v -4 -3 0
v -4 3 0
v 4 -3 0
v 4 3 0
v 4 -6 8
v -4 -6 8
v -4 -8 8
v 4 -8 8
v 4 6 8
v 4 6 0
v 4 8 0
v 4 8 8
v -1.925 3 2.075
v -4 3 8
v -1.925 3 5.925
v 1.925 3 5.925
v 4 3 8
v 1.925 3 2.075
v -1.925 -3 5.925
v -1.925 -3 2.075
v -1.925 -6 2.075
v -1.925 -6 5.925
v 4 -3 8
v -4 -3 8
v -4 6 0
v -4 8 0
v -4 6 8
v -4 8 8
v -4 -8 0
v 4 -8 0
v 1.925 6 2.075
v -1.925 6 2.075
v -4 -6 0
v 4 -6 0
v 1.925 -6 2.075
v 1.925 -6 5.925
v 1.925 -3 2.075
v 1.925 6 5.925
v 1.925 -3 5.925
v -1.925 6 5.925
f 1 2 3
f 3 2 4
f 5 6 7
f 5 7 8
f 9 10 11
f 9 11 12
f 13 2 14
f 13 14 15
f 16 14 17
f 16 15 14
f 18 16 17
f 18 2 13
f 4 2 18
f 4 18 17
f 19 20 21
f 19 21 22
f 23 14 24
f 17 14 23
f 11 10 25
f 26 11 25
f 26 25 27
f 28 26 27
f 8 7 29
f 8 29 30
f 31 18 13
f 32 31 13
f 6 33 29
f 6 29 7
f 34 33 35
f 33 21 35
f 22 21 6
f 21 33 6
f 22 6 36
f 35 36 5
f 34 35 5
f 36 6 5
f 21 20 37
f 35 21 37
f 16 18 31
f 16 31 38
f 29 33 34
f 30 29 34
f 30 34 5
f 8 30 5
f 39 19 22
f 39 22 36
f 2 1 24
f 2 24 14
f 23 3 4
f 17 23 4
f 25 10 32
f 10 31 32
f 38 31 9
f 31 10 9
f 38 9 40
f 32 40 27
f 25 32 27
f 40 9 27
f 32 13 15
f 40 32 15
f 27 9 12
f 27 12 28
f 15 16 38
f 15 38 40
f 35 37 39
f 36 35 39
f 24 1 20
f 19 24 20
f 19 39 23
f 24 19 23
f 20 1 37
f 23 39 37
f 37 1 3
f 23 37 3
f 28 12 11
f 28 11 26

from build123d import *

# Parameters (mm, degrees)
F0_W      = 8
F0_H      = 6
F1_DEPTH  = 8
F2_W      = 3.85
F2_H      = 3.85
F3_DEPTH  = 3
F4_W      = 8
F4_H      = 8
F4_W_2    = 3.85
F4_H_2    = 3.85
F5_DEPTH  = 2
F7_W      = 3.85
F7_H      = 3.85
F8_DEPTH  = 3
F9_W      = 8
F9_H      = 8
F9_W_2    = 3.85
F9_H_2    = 3.85
F10_DEPTH = 2.35
F11_DEPTH = 0.35


with BuildPart() as f1:
    # F0 (on Top) → F1 (new body)
    with BuildSketch(Plane.XY):
        Rectangle(F0_W, F0_H)
    extrude(amount=F1_DEPTH)

    # F2 (on face) → F3 (join)
    with BuildSketch(Plane.XZ.offset(3)):
        with Locations((0, 4)):
            Rectangle(F2_W, F2_H)
    extrude(amount=F3_DEPTH)

    # F4 (on face) → F5 (join)
    with BuildSketch(Plane.XZ.offset(6)):
        with Locations((0, 4)):
            Rectangle(F4_W, F4_H)
        with Locations((0, 4)):
            Rectangle(F4_W_2, F4_H_2, mode=Mode.SUBTRACT)
        with Locations((0, 4)):
            Rectangle(F4_W_2, F4_H_2)
    extrude(amount=F5_DEPTH)

    # F7 (on face) → F8 (join)
    with BuildSketch(Plane(origin=(0, 3, 0), x_dir=(-1, 0, 0), z_dir=(0, 1, 0))):
        with Locations((0, 4)):
            Rectangle(F7_W, F7_H)
    extrude(amount=F8_DEPTH)

    # F9 (on face) → F10 (join)
    with BuildSketch(Plane(origin=(0, 6, 0), x_dir=(-1, 0, 0), z_dir=(0, 1, 0))):
        with Locations((0, 4)):
            Rectangle(F9_W, F9_H)
        with Locations((0, 4)):
            Rectangle(F9_W_2, F9_H_2, mode=Mode.SUBTRACT)
        with Locations((0, 4)):
            Rectangle(F9_W_2, F9_H_2)
    extrude(amount=F10_DEPTH)

    # F11 (cut): a face of the model
    f11_faces = [f1.faces().sort_by_distance(p)[0] for p in [
        (0, 8.35, 4),
    ]]
    extrude(f11_faces, amount=-F11_DEPTH, mode=Mode.SUBTRACT)


solid = f1.part
